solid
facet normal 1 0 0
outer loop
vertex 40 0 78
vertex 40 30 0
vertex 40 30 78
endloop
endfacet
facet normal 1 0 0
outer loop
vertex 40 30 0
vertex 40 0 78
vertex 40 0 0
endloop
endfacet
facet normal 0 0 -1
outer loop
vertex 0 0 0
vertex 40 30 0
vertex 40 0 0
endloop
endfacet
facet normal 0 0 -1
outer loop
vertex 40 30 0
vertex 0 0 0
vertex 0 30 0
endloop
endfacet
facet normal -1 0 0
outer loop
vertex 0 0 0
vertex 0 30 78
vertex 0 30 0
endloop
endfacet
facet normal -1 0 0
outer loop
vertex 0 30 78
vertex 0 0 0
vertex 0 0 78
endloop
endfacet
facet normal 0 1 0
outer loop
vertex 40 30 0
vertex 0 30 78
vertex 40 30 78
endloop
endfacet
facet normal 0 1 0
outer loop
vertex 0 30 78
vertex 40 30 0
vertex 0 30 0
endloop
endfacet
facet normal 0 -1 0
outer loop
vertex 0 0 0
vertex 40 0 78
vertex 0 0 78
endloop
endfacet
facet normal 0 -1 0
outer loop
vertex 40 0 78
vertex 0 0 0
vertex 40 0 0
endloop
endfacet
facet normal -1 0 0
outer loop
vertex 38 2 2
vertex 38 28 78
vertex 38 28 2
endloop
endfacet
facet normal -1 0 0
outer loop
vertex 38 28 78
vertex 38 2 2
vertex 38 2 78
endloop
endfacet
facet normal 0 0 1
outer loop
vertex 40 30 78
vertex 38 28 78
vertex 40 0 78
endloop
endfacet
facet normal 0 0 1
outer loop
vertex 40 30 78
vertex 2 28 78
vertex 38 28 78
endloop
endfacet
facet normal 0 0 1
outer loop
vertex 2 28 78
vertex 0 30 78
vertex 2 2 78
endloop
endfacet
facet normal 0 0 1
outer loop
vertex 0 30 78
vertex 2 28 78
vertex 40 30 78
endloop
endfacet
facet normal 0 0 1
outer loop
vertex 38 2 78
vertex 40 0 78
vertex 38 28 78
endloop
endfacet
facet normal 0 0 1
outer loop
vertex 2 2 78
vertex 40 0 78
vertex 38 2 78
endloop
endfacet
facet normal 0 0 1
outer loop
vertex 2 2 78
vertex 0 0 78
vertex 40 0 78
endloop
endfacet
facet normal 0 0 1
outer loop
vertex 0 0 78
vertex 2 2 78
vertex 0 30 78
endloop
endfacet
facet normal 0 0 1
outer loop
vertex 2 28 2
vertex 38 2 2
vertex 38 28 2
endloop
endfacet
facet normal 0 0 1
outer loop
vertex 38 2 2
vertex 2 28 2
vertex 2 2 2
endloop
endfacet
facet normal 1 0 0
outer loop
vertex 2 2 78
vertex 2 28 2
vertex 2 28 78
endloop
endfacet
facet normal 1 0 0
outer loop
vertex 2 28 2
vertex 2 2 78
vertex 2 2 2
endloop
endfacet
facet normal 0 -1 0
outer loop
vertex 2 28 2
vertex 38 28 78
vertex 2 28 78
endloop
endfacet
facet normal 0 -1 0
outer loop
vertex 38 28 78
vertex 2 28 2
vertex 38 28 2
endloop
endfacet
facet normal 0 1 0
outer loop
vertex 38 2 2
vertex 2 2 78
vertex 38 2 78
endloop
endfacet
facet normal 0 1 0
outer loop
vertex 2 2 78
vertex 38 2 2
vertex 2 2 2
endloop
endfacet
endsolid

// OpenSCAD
// This design has replaced its joints by actual connections

outer_width = 40; // mm
outer_depth = 30; // mm
outer_height = 80; // mm
wall_thickness = 2; // mm
inner_width = outer_width - (2 * wall_thickness); // mm
inner_depth = outer_depth - (2 * wall_thickness); // mm
inner_height = outer_height - (2 * wall_thickness); // mm
n_teeth = 10;
x_teeth_length = inner_width / n_teeth;
y_teeth_length = inner_depth / n_teeth;
z_teeth_length = inner_height/ n_teeth;
piezo_diameter = 12; // mm
piezo_radius = piezo_diameter  / 2; // mm
cable_diameter = 5; // mm
cable_radius = cable_diameter / 2; // mm

// The teeth need some air between them.
// This is the amount of space that each tooth get shorten
// with at each side
teeth_air = 0.25; // mm

spacing = 1; // Spacing between the parts, mm


// Creates the hollow cube
module create_hollow_cube() {
  difference() {
    cube([outer_width,outer_depth,outer_height]);
    translate([wall_thickness,wall_thickness,wall_thickness])
      cube([inner_width,inner_depth,inner_height]);
  }
}

// The hollow cube with the top part removed. No teeth joint yet
module create_open_cube() {
  difference() {
    create_hollow_cube();
    translate([0, 0, outer_height - wall_thickness])
      cube([outer_width,outer_depth,wall_thickness]);
  }
}

create_open_cube();

/*
module create_top_piece() {
  cube([outer_width,outer_depth,wall_thickness], center = true);
}


translate([0, 0, outer_height / 2 + spacing + spacing])
  create_top_piece();

create_hollow_cube();



/*

part_1_x = -outer_width - outer_depth;
part_1_y = -outer_depth / 2;

part_2_x = part_1_x + outer_width + wall_thickness + spacing;
part_2_y = part_1_y;

part_3_x = part_2_x + outer_height + wall_thickness + spacing;
part_3_y = part_2_y;

part_4_x = part_3_x + outer_width + wall_thickness + spacing;
part_4_y = part_3_y;

part_5_x = part_3_x;
part_5_y = part_3_y + outer_depth + wall_thickness + spacing;

part_6_x = part_3_x;
part_6_y = part_3_y - (outer_depth / 2) - (outer_height / 2) - (3 * wall_thickness) - spacing;

//
//        +--+  +--+  +--+
//        |  |  |  |  |  |
//        +..+--+..+--+..+--+--+
//        |                 .  |
//     +--+                 +--+
//     |  .                 |   
//     +--+                 +--+
//        |                 .  |
//     +--+                 +--+
//     |  .                 |
//     +--+--+..+--+..+--+..+
//           |  |  |  |  |  |
//           +--+  +--+  +--+
//


module draw_piece(
  part_x,
  part_y,
  inner_dx,
  inner_dy,
  n_teeth
) {
  translate([part_x, part_y, 0])
    cube([inner_dx, inner_dy, wall_thickness]);

  x_teeth_length = inner_dx / n_teeth;
  y_teeth_length = inner_dy / n_teeth;

  // Left teeth
  for (i = [0:n_teeth/2-1])
    translate([part_x, part_y, 0])
      translate([-wall_thickness, i * y_teeth_length  * 2,0])
        translate([0, teeth_air, 0])
          cube([wall_thickness,y_teeth_length - teeth_air,wall_thickness]);
  // Right teeth
  for (i = [0:n_teeth/2-1])
    translate([part_x, part_y, 0])
      translate([inner_dx, y_teeth_length + (i * y_teeth_length  * 2),0])
        translate([0, teeth_air, 0])
          cube([wall_thickness,y_teeth_length - teeth_air,wall_thickness]);
  // Top, between 5 and 1
  for (i = [0:n_teeth/2-1])
    translate([part_x, part_y, 0])
      translate([0 + (i * x_teeth_length  * 2), inner_dy, 0])
        translate([teeth_air, 0, 0])
          cube([x_teeth_length - teeth_air, wall_thickness,wall_thickness]);
  // Bottom teeth, between 1 and 6 
  for (i = [0:n_teeth/2-1])
    translate([part_x, part_y, 0])
      translate([x_teeth_length + (i * x_teeth_length  * 2), -wall_thickness,0])
        translate([teeth_air, 0, 0])
          cube([x_teeth_length - teeth_air, wall_thickness, wall_thickness]);

}


//     +-+
//     |5|
// +-+-+-+-+
// |1|2|3|4|
// +-+-+-+-+
//     |6|
//     +-+

draw_piece(
  part_1_x, // part_x 
  part_1_y,  // part_y
  inner_width, // inner_dx
  inner_depth, // inner_dy
  n_teeth // n_teeth
);

draw_piece(
  part_2_x, // part_x 
  part_2_y,  // part_y
  inner_height, // inner_dx
  inner_depth, // inner_dy
  n_teeth // n_teeth
);


difference() {
  union() {
    draw_piece(
      part_3_x, // part_x 
      part_3_y,  // part_y
      inner_width, // inner_dx
      inner_depth, // inner_dy
      n_teeth // n_teeth
    );
  }

  translate([part_3_x + piezo_radius + wall_thickness, part_3_y + piezo_radius + wall_thickness, 0.5])
    cylinder(10, (piezo_diameter / 2) + (teeth_air * 2), (piezo_diameter / 2) + (teeth_air * 2));
  translate([part_3_x + piezo_radius + wall_thickness, part_3_y + piezo_radius + wall_thickness, -5])
    cylinder(10, piezo_radius - (teeth_air * 2), piezo_radius - (teeth_air * 2));
}

difference() {
  union() {
    draw_piece(
      part_4_x, // part_x 
      part_4_y,  // part_y
      inner_height, // inner_dx
      inner_depth, // inner_dy
      n_teeth // n_teeth
    );
  }
  translate([part_4_x + cable_radius + (inner_height / 4) + wall_thickness, part_4_y + cable_radius + (inner_depth / 2) + wall_thickness, -5])
    cylinder(10, cable_radius + (teeth_air * 2), cable_radius + (teeth_air * 2));

}

draw_piece(
  part_5_x, // part_x 
  part_5_y,  // part_y
  inner_width, // inner_dx
  inner_height, // inner_dy
  n_teeth // n_teeth
);


draw_piece(
  part_6_x, // part_x 
  part_6_y,  // part_y
  inner_width, // inner_dx
  inner_height, // inner_dy
  n_teeth // n_teeth
);


*/
